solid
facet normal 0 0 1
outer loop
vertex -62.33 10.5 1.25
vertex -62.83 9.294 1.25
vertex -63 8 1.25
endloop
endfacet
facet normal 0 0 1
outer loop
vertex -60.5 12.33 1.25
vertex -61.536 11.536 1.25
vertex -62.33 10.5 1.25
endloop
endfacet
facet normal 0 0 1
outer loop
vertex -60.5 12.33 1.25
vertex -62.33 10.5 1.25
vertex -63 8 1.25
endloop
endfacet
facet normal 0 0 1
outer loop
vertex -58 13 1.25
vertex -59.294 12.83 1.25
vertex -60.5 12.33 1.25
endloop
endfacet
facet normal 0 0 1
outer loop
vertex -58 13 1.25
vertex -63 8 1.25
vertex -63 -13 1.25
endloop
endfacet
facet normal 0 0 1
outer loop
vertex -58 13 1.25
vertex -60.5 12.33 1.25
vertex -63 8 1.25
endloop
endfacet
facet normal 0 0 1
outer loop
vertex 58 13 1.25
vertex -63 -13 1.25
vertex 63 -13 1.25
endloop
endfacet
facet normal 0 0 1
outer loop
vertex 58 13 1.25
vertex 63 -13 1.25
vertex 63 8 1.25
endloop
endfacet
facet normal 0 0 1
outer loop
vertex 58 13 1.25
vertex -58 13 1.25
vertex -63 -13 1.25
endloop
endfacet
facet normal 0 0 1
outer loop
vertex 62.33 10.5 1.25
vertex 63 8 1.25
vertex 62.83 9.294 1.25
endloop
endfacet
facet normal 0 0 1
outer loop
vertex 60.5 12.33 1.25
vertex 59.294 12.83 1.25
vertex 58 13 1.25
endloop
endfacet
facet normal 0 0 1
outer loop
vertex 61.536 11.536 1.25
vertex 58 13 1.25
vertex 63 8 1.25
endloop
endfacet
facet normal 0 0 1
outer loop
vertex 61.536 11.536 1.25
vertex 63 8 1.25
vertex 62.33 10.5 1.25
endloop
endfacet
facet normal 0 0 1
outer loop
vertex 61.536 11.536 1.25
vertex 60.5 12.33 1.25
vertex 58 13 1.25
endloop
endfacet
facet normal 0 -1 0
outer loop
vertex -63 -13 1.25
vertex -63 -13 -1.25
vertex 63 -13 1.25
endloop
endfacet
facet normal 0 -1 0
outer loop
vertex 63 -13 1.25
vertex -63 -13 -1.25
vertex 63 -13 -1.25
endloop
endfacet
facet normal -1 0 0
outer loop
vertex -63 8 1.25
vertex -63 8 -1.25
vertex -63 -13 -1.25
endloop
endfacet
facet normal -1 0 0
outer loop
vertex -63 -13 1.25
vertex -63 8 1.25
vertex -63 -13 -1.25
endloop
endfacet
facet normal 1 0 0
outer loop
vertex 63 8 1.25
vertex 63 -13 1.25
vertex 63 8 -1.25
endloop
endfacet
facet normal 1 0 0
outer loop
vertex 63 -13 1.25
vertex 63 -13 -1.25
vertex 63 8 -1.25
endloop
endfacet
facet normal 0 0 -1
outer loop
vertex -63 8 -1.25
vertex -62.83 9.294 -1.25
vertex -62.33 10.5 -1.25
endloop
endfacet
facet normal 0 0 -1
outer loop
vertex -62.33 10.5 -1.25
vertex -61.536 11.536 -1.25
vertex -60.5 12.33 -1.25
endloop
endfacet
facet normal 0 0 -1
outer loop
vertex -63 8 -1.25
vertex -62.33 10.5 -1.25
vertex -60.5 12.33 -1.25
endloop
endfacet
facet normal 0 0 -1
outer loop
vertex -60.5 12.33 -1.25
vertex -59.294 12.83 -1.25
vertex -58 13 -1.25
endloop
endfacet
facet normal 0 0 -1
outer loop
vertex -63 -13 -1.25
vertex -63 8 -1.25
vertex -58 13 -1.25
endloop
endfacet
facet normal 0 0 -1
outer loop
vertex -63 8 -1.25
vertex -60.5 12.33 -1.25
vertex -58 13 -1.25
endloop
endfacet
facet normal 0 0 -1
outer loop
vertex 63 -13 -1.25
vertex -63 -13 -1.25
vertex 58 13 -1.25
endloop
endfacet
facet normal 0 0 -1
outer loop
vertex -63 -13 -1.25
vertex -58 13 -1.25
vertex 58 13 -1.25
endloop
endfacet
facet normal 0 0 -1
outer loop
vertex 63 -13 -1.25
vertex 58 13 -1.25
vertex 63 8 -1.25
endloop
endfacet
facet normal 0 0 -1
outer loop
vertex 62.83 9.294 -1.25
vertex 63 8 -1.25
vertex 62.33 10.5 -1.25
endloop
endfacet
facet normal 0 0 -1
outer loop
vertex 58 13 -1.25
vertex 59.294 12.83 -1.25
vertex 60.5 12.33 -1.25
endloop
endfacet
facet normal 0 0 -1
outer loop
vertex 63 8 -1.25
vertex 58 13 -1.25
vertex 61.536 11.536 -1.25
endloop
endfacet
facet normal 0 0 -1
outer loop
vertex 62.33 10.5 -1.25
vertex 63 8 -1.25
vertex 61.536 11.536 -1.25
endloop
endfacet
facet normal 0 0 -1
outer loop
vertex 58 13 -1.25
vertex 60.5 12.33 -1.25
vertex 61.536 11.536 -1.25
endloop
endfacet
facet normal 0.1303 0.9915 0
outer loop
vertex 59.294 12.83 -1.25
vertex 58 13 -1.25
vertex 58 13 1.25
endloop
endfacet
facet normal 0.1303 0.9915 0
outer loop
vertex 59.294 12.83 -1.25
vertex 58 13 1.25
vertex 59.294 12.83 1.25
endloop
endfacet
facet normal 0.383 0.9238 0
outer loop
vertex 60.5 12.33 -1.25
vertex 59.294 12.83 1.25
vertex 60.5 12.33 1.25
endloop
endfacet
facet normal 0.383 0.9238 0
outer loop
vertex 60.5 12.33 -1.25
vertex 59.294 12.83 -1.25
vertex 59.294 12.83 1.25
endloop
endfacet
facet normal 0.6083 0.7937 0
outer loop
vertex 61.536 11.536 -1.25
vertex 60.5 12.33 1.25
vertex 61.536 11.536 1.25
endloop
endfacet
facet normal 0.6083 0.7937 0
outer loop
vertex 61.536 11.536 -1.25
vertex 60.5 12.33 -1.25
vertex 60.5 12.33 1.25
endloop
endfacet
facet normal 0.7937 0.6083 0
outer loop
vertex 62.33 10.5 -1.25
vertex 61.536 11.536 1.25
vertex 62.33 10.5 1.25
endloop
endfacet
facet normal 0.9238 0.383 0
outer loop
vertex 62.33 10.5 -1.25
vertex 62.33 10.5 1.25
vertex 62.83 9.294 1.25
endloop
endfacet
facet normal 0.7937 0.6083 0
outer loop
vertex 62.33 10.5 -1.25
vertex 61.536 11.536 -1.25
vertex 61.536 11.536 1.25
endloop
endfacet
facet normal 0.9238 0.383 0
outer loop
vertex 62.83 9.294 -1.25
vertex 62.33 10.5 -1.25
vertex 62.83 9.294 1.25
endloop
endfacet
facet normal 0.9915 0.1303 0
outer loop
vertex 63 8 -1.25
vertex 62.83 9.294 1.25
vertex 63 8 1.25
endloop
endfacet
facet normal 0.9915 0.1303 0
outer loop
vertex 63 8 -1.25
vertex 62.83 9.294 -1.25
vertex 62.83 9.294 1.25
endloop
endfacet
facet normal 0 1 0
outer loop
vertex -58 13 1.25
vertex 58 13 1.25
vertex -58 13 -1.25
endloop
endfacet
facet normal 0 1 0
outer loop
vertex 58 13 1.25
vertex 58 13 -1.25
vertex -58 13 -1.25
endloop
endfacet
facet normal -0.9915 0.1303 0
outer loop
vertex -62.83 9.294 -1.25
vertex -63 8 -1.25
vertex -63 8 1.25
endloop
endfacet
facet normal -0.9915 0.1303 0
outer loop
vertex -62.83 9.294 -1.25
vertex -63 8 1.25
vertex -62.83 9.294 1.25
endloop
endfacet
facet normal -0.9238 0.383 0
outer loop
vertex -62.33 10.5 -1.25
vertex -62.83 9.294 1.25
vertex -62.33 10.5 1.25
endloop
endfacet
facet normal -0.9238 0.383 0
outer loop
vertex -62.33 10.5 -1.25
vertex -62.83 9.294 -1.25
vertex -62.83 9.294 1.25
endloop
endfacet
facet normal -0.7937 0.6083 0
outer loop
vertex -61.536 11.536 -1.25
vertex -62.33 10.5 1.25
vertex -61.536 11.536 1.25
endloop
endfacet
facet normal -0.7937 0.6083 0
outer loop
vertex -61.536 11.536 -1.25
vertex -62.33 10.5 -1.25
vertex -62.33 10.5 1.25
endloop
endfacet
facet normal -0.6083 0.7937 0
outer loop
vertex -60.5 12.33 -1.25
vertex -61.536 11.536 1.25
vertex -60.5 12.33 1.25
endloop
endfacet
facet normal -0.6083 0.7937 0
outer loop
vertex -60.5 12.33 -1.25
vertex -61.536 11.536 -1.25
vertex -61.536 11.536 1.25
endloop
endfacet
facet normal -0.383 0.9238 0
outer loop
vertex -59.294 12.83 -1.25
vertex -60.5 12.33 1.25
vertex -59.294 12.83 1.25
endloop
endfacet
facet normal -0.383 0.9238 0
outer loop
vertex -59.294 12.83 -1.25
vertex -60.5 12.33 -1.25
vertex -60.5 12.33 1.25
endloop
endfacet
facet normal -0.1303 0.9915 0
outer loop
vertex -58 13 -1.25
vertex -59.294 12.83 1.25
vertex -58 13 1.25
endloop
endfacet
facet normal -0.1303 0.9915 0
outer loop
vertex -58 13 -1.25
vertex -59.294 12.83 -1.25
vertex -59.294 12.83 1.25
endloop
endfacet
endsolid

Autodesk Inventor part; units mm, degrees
ref_plane "YZ Plane" through (0, 0, 0) normal (1, 0, 0) x (0, 1, 0)
ref_plane "XZ Plane" through (0, 0, 0) normal (0, 1, 0) x (-1, 0, 0)
ref_plane "XY Plane" through (0, 0, 0) normal (0, 0, 1) x (1, 0, 0)
sketch "草圖1" plane through (0, 0, 0) normal (0, 0, 1) x (1, 0, 0)
  line L0 (0, 0) -> (-46.9602, 0) construction
  line L1 (0, 0) -> (0, 45.4619) construction
  line L2 (-63, -13) -> (63, -13)
  line L3 (63, -13) -> (63, 13)
  line L4 (63, 13) -> (-63, 13)
  line L5 (-63, 13) -> (-63, -13)
  line L6 (-63, -13) -> (63, 13) construction
  line L7 (63, -13) -> (-63, 13) construction
  dimension "d0" = 26
  dimension "d1" = 126
extrude "擠出1" add sketch "草圖1" along normal mid plane 2.5
fillet "圓角1" radius 5 2 edges at (-63, 13, 0) (63, 13, 0)
properties part number "0 零件" material "橡膠"
